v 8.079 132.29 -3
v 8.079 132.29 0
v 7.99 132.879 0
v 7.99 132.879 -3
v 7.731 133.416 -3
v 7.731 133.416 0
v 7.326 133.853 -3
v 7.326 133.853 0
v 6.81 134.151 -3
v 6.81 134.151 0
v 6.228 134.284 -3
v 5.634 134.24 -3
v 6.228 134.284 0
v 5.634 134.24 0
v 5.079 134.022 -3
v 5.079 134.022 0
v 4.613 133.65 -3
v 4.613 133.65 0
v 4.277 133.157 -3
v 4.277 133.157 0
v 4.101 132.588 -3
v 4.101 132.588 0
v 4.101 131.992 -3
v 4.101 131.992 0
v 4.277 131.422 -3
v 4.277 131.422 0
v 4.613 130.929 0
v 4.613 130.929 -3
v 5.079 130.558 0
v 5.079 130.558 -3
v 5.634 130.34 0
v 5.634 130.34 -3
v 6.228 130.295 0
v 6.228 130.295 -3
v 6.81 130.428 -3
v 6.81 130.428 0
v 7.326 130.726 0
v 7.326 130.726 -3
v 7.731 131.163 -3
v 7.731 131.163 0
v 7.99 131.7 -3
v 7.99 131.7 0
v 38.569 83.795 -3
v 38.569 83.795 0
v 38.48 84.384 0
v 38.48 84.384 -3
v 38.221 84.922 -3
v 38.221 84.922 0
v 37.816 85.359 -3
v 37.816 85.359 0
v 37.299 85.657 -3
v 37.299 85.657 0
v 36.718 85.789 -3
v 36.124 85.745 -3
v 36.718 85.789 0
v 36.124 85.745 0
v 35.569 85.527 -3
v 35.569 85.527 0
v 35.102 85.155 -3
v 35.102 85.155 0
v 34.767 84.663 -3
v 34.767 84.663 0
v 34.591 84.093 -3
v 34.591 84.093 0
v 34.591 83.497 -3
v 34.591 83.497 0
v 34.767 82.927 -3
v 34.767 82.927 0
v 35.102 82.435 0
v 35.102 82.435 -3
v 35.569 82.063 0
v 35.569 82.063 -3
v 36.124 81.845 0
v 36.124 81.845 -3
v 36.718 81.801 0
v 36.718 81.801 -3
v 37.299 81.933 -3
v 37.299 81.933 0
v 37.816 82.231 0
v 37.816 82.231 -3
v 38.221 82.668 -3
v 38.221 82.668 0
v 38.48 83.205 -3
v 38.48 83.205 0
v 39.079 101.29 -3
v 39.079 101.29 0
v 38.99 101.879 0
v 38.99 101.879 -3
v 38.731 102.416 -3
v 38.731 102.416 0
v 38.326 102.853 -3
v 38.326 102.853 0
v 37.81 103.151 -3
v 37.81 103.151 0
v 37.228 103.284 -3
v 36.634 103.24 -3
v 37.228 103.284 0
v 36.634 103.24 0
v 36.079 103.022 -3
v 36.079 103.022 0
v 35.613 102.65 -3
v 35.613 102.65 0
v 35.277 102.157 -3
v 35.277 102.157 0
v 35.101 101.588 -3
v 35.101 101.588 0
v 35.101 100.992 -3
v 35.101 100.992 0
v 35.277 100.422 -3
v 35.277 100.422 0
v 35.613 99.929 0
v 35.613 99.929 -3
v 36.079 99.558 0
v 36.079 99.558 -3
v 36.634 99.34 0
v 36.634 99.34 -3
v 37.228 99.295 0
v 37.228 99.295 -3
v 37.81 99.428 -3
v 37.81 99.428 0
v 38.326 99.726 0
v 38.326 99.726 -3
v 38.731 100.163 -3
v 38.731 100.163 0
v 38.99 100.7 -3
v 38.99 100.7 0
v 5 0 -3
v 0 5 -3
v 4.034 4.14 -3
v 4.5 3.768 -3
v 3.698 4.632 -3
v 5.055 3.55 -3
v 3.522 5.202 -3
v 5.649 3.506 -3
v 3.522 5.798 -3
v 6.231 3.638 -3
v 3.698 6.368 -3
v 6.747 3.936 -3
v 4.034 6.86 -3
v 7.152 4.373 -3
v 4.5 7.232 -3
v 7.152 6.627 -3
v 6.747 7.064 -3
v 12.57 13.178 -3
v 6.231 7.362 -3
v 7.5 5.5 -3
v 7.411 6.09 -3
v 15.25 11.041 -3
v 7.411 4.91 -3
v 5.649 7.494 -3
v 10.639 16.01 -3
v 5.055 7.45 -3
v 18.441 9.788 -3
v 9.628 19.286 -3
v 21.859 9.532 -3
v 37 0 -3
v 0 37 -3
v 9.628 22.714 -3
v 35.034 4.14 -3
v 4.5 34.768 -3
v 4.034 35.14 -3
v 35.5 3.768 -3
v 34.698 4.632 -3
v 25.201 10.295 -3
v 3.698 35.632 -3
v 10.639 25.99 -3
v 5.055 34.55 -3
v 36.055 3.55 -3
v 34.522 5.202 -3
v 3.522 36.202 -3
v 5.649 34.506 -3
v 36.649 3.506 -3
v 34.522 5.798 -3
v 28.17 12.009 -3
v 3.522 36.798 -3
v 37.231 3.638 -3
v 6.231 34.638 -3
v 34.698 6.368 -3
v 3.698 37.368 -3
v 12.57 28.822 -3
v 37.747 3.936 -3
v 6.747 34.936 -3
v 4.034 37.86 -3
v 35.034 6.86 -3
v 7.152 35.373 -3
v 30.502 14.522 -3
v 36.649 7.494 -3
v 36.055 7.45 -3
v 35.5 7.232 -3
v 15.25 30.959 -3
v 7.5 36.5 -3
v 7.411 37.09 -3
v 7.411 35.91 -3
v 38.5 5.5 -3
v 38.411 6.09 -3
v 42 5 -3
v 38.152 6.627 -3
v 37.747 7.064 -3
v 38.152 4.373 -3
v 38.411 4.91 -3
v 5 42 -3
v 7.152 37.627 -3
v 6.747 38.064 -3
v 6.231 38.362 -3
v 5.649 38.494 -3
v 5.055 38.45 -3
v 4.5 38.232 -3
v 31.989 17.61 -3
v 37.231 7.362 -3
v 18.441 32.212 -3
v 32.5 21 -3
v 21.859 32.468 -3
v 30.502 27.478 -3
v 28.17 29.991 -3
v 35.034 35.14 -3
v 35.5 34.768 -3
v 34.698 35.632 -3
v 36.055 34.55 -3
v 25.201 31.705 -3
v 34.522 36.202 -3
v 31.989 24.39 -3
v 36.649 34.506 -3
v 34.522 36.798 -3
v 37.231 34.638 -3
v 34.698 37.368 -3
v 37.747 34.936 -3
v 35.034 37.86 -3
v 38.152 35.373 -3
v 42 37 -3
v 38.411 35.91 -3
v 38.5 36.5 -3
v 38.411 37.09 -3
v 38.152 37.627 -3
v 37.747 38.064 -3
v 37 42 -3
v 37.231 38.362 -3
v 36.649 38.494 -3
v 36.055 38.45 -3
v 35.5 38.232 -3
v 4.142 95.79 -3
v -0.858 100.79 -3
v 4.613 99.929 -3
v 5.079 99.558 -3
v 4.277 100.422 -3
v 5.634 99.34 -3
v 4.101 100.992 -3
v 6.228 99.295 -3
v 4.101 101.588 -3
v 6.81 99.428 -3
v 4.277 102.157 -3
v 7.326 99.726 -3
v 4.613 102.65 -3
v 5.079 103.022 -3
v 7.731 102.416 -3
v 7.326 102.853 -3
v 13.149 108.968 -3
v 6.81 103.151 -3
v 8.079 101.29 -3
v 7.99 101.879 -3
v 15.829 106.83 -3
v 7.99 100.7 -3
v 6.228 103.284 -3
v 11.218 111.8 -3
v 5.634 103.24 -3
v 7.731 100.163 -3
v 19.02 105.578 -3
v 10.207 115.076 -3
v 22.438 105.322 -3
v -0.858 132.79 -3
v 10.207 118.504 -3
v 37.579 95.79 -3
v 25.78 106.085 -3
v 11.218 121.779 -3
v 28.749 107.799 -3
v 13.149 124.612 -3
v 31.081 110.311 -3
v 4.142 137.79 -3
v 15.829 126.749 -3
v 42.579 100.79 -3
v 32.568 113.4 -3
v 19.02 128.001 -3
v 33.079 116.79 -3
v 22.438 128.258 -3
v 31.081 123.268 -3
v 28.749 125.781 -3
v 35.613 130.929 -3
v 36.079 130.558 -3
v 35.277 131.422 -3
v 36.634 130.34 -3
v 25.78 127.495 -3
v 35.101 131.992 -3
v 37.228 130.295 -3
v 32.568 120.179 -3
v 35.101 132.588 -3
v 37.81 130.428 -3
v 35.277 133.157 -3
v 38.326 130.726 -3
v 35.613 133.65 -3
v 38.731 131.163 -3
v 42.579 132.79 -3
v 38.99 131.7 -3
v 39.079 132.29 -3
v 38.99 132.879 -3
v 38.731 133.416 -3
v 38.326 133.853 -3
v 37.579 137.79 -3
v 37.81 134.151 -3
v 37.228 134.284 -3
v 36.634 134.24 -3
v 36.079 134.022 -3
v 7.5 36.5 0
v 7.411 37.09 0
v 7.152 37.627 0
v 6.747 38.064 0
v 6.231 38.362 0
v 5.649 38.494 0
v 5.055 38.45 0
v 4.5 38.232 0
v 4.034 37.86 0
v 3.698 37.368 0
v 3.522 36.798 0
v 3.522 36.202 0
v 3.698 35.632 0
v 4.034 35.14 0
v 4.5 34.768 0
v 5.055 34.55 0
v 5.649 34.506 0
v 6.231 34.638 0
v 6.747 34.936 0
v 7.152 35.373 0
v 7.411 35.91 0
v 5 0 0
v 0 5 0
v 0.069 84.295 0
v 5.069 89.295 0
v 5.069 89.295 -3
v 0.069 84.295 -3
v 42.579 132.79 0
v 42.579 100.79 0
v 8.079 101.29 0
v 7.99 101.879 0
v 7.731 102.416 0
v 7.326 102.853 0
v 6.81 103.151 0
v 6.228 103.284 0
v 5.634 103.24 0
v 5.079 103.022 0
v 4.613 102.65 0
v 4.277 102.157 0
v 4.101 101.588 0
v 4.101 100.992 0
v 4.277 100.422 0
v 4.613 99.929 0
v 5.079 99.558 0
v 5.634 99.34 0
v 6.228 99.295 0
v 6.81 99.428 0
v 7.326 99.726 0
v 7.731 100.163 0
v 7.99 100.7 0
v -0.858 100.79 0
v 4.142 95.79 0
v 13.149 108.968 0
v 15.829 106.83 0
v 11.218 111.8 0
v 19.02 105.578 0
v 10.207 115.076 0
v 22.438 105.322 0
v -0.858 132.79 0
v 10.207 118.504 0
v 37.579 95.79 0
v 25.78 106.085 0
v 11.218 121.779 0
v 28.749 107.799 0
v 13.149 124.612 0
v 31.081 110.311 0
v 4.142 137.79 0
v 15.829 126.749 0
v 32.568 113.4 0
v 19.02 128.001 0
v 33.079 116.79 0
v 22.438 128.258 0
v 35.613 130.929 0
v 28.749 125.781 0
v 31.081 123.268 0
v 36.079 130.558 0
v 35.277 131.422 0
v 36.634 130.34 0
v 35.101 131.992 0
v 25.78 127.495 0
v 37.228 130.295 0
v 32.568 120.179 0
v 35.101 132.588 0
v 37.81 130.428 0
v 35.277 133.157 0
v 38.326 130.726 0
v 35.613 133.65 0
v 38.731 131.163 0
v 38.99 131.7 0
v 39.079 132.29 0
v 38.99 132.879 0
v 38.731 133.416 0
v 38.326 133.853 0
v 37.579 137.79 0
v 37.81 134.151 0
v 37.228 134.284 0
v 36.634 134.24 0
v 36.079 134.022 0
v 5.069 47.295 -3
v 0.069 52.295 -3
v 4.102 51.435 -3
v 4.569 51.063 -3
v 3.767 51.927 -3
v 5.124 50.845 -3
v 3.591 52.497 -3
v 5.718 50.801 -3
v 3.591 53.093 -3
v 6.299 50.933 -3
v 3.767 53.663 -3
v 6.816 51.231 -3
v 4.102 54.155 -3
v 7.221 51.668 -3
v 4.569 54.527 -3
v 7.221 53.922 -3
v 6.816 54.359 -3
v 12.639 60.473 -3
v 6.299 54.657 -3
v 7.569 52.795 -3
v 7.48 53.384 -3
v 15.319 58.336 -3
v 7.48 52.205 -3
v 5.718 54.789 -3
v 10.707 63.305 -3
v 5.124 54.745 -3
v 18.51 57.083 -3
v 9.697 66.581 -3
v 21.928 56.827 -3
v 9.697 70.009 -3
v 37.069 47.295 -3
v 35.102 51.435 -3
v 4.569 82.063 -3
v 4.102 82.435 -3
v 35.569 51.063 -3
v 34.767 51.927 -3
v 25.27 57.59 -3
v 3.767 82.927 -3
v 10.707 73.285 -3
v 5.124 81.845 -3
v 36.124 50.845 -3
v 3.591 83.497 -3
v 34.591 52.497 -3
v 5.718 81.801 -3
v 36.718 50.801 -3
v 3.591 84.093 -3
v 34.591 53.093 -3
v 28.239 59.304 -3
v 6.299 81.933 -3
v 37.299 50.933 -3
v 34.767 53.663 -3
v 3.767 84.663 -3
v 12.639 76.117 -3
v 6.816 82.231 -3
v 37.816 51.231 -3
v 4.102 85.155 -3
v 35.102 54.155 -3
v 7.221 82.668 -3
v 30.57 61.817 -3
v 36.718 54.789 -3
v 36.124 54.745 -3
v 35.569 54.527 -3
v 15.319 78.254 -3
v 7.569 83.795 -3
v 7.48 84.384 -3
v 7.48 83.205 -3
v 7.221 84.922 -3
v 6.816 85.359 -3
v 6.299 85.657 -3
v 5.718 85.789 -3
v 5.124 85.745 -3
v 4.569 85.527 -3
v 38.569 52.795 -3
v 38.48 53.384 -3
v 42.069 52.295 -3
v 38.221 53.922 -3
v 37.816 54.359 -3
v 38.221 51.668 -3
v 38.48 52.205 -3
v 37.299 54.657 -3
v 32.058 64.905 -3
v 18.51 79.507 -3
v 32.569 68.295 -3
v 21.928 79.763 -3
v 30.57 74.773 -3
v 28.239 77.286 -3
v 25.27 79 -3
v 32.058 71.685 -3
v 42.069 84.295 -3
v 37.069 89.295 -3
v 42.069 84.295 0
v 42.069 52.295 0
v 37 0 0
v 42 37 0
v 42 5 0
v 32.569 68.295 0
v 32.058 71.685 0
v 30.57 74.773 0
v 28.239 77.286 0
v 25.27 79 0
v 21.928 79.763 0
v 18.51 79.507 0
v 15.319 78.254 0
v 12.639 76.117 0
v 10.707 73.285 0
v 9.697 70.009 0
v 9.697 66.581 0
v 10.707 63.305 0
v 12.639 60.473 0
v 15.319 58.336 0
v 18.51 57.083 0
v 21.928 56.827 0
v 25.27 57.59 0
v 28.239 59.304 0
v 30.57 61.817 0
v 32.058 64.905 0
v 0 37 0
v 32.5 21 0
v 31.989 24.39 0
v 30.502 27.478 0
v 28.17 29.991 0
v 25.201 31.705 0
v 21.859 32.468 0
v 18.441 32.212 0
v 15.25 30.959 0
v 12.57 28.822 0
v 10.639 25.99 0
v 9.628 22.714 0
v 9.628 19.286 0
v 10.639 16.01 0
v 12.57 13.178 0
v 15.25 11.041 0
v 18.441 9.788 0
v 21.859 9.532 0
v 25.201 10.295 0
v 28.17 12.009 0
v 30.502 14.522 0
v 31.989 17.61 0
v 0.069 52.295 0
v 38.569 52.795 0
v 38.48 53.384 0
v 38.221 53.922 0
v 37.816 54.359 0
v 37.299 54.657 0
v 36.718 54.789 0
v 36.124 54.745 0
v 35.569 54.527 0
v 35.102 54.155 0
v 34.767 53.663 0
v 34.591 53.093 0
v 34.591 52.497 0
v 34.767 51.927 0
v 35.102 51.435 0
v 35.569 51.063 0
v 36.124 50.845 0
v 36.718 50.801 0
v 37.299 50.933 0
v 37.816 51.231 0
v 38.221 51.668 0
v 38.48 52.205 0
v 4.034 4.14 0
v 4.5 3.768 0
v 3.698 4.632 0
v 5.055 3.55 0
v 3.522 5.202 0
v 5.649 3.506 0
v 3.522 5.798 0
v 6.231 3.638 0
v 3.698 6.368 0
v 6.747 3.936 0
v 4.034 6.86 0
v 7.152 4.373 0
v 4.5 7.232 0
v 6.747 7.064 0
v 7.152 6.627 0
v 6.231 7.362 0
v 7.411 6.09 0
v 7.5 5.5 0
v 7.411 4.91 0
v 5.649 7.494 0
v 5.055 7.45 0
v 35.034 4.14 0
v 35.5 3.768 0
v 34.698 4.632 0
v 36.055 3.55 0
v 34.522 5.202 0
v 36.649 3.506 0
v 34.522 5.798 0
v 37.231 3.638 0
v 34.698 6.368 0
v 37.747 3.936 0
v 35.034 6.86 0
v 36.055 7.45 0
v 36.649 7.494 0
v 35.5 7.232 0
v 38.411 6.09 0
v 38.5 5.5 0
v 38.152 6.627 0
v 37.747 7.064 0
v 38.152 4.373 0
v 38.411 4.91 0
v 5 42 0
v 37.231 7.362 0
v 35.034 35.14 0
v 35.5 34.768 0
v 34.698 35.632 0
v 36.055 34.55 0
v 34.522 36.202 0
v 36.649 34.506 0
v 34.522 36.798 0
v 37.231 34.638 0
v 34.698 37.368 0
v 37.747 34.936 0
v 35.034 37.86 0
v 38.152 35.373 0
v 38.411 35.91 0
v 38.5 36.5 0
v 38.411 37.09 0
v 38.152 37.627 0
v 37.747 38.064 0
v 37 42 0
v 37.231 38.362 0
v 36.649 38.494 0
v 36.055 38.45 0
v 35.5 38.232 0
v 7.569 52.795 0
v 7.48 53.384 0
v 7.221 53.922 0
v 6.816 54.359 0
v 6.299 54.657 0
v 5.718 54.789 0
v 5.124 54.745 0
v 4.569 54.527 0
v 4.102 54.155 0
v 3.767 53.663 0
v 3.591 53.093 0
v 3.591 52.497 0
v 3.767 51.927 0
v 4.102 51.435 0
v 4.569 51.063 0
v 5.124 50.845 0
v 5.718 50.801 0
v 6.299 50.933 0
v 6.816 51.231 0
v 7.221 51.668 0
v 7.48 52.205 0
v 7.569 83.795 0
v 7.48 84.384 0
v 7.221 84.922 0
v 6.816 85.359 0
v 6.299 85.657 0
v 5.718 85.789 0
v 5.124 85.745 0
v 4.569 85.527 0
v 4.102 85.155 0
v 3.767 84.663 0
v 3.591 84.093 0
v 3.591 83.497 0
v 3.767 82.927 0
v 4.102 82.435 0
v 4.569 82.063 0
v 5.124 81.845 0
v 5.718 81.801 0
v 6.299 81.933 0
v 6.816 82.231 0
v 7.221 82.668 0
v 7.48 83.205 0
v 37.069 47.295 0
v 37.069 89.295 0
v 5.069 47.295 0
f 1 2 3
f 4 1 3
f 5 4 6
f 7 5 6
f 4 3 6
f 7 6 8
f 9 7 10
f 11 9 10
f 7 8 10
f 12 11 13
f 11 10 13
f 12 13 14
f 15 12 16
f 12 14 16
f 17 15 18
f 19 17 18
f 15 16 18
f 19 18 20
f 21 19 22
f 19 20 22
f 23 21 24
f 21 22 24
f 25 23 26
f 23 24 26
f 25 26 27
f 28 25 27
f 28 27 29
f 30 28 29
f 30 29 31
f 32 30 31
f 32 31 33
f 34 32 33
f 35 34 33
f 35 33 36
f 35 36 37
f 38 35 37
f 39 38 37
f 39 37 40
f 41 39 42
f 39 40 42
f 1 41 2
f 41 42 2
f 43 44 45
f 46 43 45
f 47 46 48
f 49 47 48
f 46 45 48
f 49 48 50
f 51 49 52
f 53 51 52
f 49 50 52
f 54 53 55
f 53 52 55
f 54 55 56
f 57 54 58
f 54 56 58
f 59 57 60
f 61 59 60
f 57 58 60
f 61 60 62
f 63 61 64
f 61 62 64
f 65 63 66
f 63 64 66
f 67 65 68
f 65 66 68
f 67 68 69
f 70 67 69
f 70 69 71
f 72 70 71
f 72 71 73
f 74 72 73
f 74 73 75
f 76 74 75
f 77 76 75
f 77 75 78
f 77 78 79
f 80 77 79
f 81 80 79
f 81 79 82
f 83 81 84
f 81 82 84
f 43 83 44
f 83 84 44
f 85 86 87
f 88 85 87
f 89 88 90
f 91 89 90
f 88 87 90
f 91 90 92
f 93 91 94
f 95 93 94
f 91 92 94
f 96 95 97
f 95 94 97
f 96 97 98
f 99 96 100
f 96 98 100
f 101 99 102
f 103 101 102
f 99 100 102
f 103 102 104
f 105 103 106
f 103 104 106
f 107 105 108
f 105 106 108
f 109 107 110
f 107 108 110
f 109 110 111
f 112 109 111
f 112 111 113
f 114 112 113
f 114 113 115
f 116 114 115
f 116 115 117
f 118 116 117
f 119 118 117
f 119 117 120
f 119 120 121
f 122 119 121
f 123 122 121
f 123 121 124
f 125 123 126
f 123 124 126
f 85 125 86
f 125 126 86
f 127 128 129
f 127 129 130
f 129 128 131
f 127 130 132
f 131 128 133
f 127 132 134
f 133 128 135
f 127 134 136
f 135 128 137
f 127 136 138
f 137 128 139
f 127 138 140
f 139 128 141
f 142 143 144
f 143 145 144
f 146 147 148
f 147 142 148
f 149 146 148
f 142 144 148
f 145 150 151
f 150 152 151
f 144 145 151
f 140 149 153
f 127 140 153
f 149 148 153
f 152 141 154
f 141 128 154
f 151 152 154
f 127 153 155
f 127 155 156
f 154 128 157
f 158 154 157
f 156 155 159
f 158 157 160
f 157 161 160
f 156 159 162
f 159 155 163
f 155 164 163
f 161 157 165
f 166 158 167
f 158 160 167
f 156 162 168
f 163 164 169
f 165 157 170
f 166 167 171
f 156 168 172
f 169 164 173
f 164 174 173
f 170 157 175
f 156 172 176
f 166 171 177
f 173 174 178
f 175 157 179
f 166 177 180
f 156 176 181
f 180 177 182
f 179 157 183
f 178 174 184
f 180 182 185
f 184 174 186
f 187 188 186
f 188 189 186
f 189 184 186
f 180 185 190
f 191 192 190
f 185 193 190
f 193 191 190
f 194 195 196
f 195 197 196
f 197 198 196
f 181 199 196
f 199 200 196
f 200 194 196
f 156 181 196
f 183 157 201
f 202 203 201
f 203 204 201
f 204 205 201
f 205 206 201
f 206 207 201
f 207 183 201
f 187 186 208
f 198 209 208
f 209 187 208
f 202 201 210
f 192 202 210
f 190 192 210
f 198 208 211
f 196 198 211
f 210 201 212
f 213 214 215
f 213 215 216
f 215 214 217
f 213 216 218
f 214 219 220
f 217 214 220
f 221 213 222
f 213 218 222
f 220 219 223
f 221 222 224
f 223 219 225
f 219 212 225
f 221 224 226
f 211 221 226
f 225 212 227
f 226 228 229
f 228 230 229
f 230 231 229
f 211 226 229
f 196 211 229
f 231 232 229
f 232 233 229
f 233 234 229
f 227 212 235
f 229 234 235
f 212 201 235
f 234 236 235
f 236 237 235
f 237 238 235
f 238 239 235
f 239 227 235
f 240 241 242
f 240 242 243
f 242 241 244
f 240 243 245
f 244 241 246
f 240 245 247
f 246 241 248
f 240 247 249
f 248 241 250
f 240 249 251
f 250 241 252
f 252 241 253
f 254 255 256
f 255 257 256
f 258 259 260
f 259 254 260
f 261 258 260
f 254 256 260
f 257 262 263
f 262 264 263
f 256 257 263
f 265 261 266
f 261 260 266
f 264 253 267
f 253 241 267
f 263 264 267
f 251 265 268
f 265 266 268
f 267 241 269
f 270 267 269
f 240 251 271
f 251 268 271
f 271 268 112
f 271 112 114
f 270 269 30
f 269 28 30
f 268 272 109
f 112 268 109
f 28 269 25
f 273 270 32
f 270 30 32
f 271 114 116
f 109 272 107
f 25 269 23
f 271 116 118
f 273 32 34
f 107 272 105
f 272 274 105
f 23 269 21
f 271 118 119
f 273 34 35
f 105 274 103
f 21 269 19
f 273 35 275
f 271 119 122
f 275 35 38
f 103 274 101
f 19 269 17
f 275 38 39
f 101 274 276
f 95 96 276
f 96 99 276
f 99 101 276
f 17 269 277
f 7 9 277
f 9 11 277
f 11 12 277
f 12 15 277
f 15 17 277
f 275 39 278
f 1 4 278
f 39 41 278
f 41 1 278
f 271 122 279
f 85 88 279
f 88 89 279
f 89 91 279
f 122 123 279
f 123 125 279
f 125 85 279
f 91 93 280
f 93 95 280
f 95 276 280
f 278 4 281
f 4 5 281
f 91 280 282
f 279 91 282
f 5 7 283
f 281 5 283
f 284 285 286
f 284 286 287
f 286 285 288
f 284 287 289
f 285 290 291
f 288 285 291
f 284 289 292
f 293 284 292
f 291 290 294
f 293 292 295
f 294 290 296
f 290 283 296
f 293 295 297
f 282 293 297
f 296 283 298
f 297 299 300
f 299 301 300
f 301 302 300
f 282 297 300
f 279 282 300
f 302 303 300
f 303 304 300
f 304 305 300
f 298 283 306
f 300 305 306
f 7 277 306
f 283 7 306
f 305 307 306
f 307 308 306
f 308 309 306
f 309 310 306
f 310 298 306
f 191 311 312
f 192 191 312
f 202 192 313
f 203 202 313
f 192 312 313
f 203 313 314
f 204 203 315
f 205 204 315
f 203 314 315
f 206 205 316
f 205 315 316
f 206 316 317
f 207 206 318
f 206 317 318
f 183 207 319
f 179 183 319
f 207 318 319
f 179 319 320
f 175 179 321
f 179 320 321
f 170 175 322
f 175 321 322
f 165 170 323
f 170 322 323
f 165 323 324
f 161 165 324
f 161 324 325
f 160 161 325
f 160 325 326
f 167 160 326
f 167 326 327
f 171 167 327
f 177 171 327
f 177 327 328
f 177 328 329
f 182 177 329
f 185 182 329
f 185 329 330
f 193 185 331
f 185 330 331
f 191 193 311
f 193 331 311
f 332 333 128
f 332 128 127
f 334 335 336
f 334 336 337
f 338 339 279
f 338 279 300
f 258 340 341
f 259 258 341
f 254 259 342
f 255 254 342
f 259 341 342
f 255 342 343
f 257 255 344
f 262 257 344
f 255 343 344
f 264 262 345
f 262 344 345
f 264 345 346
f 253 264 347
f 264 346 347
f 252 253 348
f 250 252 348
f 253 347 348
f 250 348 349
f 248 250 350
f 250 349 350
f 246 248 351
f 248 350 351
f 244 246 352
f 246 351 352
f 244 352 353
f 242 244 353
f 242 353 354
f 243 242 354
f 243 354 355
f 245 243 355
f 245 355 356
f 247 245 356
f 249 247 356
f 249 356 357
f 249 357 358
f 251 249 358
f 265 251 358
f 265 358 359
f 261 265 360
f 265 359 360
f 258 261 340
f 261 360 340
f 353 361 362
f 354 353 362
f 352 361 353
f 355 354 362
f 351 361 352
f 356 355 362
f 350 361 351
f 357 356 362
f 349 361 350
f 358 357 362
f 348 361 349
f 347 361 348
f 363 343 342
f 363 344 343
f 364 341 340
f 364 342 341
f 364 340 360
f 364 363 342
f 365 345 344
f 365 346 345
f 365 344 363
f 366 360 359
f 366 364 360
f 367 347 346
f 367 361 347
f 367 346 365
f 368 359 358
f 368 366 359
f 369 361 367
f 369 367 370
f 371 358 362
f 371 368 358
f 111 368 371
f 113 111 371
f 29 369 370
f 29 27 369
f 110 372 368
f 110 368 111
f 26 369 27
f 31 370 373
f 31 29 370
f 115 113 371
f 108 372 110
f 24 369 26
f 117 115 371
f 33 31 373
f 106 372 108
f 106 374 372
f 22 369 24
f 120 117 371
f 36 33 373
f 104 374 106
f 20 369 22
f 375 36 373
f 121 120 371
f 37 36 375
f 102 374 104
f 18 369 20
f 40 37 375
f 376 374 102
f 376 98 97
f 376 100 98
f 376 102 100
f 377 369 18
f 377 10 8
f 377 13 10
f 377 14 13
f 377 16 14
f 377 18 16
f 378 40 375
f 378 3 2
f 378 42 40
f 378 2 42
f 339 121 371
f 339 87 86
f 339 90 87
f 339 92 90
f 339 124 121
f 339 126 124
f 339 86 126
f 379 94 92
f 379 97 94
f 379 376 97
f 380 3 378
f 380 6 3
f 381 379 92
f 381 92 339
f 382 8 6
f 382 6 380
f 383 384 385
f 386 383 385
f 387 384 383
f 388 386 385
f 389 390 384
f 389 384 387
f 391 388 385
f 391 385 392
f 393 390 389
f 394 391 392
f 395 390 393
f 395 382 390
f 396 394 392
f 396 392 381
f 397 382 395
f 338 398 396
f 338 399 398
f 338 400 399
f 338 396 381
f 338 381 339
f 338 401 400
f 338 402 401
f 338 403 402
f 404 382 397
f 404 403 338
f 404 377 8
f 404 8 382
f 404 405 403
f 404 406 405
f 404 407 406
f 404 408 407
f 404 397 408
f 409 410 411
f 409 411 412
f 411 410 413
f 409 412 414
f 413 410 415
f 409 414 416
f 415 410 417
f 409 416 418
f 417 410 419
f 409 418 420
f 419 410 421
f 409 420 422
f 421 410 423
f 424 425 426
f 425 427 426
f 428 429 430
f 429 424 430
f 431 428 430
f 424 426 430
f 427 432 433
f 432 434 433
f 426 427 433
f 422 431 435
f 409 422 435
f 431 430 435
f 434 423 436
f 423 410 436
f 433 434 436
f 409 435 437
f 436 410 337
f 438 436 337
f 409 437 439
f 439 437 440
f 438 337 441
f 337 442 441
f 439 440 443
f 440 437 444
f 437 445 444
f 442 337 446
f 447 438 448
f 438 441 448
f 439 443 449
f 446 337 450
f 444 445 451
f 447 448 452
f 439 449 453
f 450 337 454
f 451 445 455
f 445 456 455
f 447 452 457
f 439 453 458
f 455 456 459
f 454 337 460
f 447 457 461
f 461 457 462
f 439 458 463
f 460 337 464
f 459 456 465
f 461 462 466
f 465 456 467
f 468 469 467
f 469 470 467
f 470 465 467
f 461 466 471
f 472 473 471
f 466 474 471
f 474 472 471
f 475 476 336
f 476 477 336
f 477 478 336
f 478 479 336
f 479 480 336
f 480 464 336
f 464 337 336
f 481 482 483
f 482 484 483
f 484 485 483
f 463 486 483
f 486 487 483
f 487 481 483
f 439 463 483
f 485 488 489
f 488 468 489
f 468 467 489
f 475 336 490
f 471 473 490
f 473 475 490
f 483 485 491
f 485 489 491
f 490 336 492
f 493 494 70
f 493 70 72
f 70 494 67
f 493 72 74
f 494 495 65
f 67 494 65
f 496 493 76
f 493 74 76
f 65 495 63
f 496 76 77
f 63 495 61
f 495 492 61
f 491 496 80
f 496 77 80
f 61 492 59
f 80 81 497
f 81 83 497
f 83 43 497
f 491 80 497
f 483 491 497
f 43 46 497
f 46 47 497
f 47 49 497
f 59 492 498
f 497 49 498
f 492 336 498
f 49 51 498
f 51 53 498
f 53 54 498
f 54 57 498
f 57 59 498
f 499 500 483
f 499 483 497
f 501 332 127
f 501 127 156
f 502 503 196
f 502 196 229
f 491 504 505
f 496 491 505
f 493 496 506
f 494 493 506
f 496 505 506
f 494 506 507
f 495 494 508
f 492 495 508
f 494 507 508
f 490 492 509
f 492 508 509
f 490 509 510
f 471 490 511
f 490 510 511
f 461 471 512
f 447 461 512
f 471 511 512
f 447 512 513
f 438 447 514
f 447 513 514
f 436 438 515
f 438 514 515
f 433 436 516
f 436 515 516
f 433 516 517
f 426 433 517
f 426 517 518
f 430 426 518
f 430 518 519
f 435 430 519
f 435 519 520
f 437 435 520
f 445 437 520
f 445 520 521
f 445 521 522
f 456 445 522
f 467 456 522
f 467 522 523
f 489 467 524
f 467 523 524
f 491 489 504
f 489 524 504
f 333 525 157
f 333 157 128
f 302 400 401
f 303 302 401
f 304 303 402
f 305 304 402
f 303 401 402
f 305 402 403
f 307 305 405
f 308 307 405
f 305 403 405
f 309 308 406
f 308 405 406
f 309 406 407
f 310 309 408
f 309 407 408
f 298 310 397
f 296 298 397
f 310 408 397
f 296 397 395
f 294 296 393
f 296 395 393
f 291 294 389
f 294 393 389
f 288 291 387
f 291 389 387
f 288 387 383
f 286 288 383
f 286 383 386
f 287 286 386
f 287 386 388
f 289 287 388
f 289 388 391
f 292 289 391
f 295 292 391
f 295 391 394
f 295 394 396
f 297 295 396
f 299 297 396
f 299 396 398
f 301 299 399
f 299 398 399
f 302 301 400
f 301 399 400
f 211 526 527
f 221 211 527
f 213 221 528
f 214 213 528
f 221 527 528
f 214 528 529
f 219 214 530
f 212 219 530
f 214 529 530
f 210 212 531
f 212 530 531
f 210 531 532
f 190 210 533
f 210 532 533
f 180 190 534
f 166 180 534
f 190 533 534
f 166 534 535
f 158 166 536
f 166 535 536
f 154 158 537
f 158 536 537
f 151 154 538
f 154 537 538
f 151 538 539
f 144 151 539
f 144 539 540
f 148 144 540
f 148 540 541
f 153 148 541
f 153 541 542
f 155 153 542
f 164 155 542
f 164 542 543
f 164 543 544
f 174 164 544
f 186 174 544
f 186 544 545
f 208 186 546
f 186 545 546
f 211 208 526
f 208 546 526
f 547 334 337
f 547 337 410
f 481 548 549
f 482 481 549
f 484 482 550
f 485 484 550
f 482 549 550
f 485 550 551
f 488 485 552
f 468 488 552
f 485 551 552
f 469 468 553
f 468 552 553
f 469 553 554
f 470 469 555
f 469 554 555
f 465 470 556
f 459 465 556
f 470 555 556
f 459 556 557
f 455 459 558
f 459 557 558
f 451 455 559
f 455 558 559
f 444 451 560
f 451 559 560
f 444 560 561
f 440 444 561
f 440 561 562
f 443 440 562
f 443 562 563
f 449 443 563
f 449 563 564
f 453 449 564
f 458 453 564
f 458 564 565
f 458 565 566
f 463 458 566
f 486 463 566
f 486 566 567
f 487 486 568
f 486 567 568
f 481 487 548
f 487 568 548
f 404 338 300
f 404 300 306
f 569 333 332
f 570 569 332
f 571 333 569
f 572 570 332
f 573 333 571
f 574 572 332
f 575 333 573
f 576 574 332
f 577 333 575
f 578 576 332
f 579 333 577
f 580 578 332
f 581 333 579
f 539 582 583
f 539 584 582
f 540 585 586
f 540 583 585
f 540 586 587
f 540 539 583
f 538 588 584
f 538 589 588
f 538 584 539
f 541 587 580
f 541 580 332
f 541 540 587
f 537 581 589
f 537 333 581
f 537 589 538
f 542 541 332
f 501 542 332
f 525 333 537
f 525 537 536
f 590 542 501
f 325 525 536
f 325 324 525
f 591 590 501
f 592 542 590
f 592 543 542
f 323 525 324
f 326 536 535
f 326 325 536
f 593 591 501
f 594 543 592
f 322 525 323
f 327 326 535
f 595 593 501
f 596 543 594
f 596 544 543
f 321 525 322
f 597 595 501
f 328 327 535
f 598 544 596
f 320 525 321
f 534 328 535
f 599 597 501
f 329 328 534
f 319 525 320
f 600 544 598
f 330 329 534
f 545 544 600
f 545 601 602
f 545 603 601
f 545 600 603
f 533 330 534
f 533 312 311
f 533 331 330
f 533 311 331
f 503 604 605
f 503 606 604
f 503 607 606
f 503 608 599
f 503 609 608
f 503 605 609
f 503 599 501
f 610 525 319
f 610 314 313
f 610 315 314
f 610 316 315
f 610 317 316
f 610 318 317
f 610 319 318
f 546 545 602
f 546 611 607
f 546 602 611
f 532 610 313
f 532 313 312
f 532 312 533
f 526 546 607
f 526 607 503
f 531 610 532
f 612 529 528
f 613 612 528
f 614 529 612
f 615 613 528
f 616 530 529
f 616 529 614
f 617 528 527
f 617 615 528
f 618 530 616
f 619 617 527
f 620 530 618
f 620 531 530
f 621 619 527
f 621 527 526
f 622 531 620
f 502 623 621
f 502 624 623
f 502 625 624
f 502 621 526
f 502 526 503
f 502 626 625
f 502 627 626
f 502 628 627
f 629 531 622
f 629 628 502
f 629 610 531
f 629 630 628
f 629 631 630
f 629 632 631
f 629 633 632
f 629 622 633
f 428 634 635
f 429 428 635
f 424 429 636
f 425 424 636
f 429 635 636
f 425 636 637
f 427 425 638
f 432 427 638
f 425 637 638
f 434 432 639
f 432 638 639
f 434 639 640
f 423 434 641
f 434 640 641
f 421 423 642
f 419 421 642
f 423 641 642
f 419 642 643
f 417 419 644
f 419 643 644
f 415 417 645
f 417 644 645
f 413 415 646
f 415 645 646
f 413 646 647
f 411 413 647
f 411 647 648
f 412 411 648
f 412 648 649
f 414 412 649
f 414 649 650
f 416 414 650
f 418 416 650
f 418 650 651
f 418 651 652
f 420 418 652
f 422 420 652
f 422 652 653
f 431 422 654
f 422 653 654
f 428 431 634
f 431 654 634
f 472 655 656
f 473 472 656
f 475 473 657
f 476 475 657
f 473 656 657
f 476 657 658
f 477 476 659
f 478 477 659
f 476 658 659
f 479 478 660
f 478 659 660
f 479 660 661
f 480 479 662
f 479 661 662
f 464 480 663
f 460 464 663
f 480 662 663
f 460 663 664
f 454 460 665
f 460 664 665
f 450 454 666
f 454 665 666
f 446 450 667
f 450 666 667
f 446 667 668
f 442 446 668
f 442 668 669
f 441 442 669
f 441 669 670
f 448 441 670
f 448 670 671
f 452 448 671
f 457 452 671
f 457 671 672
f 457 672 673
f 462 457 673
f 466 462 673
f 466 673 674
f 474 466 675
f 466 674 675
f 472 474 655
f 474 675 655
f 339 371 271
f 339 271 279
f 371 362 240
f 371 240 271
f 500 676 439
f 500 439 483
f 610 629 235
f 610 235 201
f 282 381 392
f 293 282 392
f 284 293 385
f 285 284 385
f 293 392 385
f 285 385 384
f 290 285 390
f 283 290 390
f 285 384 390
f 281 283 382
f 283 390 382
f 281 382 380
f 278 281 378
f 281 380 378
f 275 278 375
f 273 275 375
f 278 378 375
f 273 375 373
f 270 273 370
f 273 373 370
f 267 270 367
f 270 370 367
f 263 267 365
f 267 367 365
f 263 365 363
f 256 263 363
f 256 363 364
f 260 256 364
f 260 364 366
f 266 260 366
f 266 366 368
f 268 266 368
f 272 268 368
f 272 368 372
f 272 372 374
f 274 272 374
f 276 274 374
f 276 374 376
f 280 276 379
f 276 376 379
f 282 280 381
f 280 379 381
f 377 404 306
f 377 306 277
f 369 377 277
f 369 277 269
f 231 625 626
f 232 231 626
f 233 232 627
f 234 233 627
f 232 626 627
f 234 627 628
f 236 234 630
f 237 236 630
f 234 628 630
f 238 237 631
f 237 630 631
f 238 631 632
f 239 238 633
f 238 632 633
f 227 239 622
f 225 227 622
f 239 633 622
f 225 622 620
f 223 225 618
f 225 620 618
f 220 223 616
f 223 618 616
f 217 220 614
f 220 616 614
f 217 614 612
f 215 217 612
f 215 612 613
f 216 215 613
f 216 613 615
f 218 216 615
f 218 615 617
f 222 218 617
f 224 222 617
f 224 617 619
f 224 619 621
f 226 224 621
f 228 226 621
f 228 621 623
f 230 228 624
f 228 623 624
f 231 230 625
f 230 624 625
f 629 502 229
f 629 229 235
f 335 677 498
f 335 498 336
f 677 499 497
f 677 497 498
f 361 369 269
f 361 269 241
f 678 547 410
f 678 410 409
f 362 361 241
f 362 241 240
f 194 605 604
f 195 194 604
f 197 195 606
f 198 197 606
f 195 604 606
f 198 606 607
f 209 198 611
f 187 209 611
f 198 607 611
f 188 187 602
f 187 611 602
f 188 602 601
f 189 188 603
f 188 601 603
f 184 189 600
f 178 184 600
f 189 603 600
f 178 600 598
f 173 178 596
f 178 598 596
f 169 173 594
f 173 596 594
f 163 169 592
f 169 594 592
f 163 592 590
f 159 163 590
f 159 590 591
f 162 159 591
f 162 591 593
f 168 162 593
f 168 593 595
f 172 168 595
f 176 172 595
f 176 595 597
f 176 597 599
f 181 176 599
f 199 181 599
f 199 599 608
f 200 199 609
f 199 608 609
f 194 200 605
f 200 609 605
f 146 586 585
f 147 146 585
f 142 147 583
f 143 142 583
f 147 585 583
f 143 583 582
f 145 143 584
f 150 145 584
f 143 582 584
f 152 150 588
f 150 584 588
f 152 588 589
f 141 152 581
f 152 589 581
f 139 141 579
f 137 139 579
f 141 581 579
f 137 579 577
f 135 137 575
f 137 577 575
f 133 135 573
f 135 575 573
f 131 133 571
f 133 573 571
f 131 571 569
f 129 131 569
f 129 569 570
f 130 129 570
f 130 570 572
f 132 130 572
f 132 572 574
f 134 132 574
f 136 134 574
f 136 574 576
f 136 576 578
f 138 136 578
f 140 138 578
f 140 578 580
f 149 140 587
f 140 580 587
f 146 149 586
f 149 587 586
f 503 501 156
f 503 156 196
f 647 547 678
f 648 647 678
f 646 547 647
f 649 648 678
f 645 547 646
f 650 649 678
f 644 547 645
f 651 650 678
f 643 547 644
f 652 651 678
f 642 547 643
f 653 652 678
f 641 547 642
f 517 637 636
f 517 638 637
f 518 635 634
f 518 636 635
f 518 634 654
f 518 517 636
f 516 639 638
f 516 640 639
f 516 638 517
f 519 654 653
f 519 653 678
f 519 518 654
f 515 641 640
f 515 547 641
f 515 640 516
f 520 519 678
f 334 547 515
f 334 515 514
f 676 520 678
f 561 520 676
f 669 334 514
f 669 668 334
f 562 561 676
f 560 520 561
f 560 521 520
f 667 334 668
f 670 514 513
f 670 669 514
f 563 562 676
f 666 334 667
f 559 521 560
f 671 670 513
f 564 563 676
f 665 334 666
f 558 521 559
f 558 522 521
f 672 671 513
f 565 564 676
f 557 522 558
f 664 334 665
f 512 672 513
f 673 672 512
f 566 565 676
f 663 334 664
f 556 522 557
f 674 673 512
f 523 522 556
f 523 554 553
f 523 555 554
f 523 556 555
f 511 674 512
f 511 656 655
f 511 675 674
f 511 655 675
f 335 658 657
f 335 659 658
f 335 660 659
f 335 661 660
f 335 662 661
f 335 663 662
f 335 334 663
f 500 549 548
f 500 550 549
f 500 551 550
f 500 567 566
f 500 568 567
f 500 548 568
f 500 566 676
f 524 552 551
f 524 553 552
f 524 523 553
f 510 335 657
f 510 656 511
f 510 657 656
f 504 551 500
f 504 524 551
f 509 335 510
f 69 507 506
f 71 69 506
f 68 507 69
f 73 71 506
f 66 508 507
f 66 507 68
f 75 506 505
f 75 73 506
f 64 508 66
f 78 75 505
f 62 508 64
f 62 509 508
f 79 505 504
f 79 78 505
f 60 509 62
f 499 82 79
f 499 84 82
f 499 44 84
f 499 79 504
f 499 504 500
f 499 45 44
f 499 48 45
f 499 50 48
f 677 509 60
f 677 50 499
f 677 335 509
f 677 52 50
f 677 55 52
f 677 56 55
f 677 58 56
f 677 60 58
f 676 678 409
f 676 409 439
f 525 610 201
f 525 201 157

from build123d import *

# Parameters (mm, degrees)
SCHIZZO1_R                     = 11.5
SCHIZZO1_R_2                   = 2
ESTRUSIONE_ESTRUSIONE1_DEPTH   = 3
ESTRUSIONE_ESTRUSIONE1_2_DEPTH = 3
ESTRUSIONE_ESTRUSIONE1_3_DEPTH = 3


with BuildPart() as part:
    # Schizzo1 → Estrusione-Estrusione1 (new body)
    with BuildSketch(Plane.XY):
        Polygon((5, 0), (37, 0), (42, 5), (42, 37), (37, 42), (5, 42), (0, 37), (0, 5), align=None)
        with Locations((21, 21)):
            Circle(SCHIZZO1_R, mode=Mode.SUBTRACT)
        with Locations((5.5, 36.5)):
            Circle(SCHIZZO1_R_2, mode=Mode.SUBTRACT)
        with Locations((5.5, 5.5)):
            Circle(SCHIZZO1_R_2, mode=Mode.SUBTRACT)
        with Locations((36.5, 5.5)):
            Circle(SCHIZZO1_R_2, mode=Mode.SUBTRACT)
        with Locations((36.5, 36.5)):
            Circle(SCHIZZO1_R_2, mode=Mode.SUBTRACT)
    extrude(amount=-ESTRUSIONE_ESTRUSIONE1_DEPTH)


with BuildPart() as body_2:
    # Schizzo1 → Estrusione-Estrusione1 2 (new body)
    with BuildSketch(Plane.XY):
        Polygon((5.068599414, 47.294981331), (37.068599414, 47.294981331), (42.068599414, 52.294981331), (42.068599414, 84.294981331), (37.068599414, 89.294981331), (5.068599414, 89.294981331), (0.068599414, 84.294981331), (0.068599414, 52.294981331), align=None)
        with Locations((21.068599414, 68.294981331)):
            Circle(SCHIZZO1_R, mode=Mode.SUBTRACT)
        with Locations((5.568599414, 83.794981331)):
            Circle(SCHIZZO1_R_2, mode=Mode.SUBTRACT)
        with Locations((5.568599414, 52.794981331)):
            Circle(SCHIZZO1_R_2, mode=Mode.SUBTRACT)
        with Locations((36.568599414, 52.794981331)):
            Circle(SCHIZZO1_R_2, mode=Mode.SUBTRACT)
        with Locations((36.568599414, 83.794981331)):
            Circle(SCHIZZO1_R_2, mode=Mode.SUBTRACT)
    extrude(amount=-ESTRUSIONE_ESTRUSIONE1_2_DEPTH)


with BuildPart() as body_3:
    # Schizzo1 → Estrusione-Estrusione1 3 (new body)
    with BuildSketch(Plane.XY):
        Polygon((4.141702834, 95.789678478), (37.578861826, 95.789678478), (42.578861826, 100.789678478), (42.578861826, 132.789678478), (37.578861826, 137.789678478), (4.141702834, 137.789678478), (-0.858297166, 132.789678478), (-0.858297166, 100.789678478), align=None)
        with Locations((21.578861826, 116.789678478)):
            Circle(SCHIZZO1_R, mode=Mode.SUBTRACT)
        with Locations((6.078861826, 132.289678478)):
            Circle(SCHIZZO1_R_2, mode=Mode.SUBTRACT)
        with Locations((6.078861826, 101.289678478)):
            Circle(SCHIZZO1_R_2, mode=Mode.SUBTRACT)
        with Locations((37.078861826, 101.289678478)):
            Circle(SCHIZZO1_R_2, mode=Mode.SUBTRACT)
        with Locations((37.078861826, 132.289678478)):
            Circle(SCHIZZO1_R_2, mode=Mode.SUBTRACT)
    extrude(amount=-ESTRUSIONE_ESTRUSIONE1_3_DEPTH)


solid = Compound([part.part, body_2.part, body_3.part])
